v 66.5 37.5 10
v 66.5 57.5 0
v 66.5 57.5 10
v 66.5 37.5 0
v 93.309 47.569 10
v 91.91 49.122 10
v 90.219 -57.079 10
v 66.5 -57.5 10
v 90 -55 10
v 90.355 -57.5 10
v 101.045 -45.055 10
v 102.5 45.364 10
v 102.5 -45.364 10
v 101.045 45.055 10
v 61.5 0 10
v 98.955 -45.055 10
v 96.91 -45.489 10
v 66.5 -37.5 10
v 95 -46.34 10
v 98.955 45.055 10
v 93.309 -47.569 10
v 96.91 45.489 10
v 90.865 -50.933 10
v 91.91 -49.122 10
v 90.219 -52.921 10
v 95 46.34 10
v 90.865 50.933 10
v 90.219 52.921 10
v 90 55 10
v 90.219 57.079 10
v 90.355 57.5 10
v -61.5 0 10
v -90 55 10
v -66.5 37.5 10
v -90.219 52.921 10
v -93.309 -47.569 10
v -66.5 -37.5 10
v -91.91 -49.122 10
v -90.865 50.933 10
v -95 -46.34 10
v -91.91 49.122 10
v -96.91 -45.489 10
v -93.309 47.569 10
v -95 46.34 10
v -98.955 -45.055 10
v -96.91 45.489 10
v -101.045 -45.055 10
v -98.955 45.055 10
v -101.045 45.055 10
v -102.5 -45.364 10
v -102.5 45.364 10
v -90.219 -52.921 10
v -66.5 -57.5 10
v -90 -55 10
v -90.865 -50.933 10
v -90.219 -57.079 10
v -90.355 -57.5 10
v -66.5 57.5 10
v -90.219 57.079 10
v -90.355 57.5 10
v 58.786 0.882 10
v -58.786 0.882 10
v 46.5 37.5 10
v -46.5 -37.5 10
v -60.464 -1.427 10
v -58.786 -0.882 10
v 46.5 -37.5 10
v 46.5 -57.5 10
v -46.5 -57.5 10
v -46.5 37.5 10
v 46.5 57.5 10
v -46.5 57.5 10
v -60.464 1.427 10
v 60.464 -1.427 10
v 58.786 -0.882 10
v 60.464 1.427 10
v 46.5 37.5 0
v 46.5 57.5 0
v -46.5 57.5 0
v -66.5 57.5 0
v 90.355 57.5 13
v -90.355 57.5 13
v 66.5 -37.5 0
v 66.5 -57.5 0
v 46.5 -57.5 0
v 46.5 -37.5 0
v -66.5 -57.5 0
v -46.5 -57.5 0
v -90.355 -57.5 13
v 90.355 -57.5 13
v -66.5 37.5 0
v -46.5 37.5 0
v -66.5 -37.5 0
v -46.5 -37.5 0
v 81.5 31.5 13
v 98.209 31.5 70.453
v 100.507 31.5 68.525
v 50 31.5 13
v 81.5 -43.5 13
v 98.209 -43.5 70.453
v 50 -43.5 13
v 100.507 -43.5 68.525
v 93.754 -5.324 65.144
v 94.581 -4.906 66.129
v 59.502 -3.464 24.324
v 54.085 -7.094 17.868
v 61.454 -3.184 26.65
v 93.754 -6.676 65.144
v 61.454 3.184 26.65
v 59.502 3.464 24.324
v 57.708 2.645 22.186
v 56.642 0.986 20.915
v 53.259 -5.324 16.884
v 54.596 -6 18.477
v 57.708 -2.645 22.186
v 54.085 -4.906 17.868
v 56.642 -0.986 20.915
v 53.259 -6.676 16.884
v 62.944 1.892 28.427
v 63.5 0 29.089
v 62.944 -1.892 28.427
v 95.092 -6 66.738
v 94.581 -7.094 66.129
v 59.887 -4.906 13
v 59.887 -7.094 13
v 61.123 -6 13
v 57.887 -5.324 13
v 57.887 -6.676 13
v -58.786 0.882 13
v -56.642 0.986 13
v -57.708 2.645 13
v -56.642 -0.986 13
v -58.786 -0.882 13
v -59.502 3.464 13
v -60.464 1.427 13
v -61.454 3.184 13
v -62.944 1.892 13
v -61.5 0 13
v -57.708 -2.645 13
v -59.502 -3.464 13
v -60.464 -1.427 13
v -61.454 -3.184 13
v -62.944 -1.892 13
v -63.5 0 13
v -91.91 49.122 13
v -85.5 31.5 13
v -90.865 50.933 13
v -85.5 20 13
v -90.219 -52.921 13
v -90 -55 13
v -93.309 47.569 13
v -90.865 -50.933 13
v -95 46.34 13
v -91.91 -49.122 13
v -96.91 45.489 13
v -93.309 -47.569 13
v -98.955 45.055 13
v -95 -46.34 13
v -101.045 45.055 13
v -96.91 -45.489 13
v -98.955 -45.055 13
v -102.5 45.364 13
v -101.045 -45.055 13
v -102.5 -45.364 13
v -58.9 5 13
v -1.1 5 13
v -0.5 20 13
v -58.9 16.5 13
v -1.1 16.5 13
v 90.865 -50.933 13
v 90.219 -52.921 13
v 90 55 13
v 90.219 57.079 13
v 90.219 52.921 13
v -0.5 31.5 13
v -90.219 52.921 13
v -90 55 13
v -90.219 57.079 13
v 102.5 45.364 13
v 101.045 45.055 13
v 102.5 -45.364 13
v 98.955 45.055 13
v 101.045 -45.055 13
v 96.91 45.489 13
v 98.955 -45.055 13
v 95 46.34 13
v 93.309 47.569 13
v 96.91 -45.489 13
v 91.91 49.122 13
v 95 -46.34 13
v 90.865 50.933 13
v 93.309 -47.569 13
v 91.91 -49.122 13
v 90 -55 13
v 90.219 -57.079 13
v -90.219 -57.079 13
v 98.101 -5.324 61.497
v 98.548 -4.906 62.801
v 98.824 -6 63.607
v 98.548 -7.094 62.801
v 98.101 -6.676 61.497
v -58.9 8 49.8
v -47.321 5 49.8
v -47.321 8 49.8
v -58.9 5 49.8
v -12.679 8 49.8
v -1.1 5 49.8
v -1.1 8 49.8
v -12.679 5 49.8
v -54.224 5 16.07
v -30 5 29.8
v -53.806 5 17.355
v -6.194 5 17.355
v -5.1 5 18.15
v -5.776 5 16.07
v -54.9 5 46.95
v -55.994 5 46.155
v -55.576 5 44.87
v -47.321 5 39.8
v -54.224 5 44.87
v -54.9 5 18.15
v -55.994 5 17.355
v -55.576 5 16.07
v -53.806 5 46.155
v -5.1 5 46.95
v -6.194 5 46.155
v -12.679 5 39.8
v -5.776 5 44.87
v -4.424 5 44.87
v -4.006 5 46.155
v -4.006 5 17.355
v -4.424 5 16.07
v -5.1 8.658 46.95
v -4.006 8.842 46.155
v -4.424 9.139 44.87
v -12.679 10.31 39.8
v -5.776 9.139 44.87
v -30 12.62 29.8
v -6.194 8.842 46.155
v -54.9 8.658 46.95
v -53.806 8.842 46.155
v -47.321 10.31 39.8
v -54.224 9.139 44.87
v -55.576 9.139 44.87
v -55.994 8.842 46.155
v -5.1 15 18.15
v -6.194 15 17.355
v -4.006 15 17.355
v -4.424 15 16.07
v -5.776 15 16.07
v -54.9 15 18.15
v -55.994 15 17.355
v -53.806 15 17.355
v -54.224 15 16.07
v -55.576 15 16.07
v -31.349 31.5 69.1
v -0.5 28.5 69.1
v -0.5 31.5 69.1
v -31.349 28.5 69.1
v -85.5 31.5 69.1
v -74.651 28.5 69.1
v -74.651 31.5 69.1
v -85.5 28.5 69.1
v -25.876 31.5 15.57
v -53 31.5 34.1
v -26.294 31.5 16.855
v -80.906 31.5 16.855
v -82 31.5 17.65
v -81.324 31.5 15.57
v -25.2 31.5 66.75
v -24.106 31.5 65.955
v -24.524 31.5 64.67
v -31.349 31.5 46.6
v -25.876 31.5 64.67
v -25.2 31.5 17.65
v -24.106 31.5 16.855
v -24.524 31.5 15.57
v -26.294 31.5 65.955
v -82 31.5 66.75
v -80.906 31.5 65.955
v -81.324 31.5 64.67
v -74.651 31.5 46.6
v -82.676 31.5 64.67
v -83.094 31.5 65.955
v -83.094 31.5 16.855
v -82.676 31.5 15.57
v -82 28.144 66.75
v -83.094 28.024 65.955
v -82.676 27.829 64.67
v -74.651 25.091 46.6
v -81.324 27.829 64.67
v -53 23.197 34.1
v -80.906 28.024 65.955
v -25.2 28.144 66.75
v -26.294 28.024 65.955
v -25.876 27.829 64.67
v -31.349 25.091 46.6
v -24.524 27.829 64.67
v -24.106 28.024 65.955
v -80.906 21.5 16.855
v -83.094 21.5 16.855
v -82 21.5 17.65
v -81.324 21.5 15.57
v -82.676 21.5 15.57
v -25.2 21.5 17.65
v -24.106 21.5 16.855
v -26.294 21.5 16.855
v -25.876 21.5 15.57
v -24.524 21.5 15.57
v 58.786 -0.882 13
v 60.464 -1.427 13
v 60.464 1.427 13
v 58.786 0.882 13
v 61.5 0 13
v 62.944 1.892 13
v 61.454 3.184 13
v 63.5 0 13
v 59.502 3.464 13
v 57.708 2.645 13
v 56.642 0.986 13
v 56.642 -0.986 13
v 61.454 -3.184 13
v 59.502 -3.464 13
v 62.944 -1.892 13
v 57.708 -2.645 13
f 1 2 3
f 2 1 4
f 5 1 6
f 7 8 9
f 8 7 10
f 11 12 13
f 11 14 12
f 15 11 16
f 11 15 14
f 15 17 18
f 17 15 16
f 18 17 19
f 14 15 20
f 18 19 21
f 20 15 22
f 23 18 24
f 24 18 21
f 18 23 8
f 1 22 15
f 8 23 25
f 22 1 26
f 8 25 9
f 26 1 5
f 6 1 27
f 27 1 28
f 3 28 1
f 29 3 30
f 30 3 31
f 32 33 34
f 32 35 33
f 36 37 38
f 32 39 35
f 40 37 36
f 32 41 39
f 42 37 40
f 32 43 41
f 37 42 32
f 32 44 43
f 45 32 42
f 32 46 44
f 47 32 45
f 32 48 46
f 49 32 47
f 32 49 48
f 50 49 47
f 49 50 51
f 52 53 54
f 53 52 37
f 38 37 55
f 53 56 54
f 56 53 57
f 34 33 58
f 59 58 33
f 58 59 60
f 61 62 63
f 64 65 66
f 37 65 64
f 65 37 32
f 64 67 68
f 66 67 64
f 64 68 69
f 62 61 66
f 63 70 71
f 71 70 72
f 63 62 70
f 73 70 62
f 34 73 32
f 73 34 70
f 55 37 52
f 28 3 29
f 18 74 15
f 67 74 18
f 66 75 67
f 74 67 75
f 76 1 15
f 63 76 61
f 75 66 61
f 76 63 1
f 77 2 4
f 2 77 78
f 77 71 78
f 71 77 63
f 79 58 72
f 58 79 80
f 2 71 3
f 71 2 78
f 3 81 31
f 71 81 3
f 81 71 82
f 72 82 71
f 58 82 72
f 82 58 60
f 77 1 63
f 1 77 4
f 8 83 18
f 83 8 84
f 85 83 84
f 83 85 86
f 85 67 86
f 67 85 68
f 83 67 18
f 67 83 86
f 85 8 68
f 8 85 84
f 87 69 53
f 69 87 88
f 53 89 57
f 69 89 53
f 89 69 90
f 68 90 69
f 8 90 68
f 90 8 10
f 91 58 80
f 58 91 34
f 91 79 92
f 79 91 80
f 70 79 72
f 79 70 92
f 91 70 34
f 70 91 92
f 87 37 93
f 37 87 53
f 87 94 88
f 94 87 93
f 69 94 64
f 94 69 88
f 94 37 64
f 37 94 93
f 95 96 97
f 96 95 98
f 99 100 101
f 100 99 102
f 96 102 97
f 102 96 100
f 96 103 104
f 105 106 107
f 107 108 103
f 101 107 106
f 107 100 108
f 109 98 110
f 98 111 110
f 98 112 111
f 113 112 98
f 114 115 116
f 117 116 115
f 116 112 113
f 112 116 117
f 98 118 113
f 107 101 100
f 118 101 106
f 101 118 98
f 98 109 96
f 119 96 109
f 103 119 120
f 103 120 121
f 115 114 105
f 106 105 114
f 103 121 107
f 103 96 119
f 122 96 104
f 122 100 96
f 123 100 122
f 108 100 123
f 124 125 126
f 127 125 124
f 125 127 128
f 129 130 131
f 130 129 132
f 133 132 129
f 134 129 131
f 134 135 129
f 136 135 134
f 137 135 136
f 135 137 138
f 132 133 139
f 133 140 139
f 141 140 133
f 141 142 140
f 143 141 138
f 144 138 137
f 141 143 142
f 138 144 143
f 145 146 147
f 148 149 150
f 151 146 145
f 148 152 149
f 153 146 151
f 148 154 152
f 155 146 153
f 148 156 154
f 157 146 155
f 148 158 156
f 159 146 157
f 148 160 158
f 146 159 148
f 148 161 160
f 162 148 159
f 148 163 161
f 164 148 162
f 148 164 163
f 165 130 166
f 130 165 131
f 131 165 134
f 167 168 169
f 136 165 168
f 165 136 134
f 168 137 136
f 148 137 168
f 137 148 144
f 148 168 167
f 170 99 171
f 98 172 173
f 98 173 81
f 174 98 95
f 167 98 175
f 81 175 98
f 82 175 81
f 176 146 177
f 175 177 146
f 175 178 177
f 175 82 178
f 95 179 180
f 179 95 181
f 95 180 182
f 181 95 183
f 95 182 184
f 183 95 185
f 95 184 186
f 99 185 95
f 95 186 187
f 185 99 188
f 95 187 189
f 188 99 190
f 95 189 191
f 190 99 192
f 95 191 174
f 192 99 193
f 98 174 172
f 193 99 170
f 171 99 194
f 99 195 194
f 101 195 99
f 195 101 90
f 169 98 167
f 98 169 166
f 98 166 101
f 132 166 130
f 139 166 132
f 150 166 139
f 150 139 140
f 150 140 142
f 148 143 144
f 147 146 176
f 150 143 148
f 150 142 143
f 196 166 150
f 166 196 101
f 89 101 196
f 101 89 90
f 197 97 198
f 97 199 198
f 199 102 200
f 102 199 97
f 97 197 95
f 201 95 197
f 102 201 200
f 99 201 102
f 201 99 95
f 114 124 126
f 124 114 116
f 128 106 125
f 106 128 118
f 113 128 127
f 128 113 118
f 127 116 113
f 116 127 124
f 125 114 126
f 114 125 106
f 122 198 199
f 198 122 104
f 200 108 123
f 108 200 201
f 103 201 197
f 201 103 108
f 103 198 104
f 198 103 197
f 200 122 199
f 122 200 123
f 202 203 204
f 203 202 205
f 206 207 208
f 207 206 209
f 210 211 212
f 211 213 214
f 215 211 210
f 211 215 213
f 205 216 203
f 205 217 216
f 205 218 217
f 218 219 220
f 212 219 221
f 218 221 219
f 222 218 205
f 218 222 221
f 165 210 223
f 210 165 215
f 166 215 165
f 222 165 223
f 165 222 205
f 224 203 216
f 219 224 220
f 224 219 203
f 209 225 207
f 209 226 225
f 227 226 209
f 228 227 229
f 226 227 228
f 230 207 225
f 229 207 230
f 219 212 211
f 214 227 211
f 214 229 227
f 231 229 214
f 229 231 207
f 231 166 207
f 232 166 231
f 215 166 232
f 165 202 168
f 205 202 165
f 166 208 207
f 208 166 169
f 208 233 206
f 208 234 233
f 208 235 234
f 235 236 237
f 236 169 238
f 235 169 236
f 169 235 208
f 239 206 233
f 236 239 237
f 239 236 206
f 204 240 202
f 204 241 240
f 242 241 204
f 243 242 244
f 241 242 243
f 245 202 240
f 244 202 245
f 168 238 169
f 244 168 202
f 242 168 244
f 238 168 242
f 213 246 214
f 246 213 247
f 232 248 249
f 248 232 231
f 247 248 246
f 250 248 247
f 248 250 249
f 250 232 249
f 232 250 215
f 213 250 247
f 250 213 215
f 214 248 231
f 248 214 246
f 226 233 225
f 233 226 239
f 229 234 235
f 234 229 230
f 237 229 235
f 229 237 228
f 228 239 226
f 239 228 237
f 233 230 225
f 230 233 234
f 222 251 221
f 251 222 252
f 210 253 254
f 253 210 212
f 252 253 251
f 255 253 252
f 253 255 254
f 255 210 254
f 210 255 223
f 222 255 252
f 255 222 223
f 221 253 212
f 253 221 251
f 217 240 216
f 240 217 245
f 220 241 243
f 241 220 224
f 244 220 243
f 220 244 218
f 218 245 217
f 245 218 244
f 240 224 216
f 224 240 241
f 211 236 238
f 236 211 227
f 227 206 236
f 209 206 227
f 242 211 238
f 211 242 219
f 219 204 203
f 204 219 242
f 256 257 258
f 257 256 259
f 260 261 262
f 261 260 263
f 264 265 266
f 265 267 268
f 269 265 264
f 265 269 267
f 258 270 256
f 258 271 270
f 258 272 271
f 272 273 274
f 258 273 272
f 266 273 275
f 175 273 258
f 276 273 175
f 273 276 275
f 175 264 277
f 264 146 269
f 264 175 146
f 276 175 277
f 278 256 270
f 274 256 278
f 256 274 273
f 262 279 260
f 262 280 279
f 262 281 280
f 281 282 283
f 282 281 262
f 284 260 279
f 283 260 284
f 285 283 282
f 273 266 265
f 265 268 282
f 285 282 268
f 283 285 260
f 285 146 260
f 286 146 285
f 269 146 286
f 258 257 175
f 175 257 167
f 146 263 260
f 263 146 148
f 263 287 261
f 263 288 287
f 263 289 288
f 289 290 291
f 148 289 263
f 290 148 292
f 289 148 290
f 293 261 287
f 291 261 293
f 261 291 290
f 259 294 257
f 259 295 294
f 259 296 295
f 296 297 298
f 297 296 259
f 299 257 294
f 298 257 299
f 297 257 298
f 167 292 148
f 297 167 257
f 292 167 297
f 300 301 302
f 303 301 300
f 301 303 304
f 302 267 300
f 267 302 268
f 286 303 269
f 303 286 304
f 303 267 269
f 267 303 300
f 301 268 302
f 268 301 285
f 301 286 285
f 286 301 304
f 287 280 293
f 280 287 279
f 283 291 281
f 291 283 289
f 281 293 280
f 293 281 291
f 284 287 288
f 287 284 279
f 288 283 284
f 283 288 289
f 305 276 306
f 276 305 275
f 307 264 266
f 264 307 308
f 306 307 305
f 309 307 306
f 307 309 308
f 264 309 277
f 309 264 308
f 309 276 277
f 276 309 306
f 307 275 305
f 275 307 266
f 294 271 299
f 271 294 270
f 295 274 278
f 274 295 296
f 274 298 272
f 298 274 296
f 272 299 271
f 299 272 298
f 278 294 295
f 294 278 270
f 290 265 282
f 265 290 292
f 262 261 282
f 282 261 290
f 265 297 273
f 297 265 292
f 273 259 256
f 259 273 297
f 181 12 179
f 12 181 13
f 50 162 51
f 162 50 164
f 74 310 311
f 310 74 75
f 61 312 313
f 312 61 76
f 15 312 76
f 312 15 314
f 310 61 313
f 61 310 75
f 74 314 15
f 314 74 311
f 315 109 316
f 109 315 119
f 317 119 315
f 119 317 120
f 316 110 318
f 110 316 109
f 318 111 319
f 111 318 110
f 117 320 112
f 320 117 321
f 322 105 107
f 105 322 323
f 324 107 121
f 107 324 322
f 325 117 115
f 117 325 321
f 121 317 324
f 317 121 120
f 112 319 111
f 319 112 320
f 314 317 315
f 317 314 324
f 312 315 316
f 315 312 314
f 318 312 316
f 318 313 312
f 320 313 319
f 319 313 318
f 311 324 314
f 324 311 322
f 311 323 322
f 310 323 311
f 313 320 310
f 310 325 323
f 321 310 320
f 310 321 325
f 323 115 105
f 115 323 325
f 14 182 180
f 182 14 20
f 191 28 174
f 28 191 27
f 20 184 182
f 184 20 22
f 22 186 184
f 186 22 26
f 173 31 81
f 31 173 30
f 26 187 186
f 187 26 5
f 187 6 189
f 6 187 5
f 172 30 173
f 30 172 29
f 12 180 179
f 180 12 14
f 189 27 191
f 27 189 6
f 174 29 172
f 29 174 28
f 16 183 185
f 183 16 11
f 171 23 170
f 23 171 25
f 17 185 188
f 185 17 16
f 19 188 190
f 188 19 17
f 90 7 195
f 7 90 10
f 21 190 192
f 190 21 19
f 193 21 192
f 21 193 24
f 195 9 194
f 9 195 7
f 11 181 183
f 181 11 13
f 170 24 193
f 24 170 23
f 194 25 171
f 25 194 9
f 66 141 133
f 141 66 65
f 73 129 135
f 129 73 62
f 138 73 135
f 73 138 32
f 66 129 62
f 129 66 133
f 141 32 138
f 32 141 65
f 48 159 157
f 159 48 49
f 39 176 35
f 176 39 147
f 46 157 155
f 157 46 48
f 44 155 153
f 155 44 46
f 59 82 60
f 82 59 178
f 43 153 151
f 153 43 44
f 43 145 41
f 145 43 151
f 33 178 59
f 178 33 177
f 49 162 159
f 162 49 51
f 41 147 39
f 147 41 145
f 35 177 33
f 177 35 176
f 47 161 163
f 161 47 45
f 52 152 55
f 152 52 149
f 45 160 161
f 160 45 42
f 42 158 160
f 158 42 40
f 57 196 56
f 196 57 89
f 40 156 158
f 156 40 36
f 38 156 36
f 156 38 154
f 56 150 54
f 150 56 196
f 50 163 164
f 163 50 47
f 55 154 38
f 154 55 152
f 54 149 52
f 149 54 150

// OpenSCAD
bottom_hole_dist = 120;
bottom_rise = 10;
width = 205;
height = 115;
rounding_w = 200;
rounding_h = 110;
rounding_r = 10;
max_depth = 80;
plateau_depth = 3;
wall = 3;
hole_d = 3;
hole_indent_depth = 0;
hole_indent_d = 7;
support_side = 20;
support_dist = 93; // x distance between supports

small_hole_depth=10;
small_hole_d = 2.3;

dc_converter_side = 75;
dc_converter_hole_dist = 63;

ups_w = 57.8;
ups_h = 36.8;
ups_hole_pos = 4;

rpi_w = 85;
rpi_h = 56.1;
rpi_hole_pos = 3.5;
rpi_hole_dist = 56.8;
whole_plate();

module whole_plate() {
    difference() {
        union() {
            // Additive
            plateau();
            for (mx = [[0,0,0], [1,0,0]]) {
                mirror(mx) {
                    for (my = [[0,0,0], [0,1,0]]) {
                        mirror(my) {
                            support();
                        }
                    }
                }
            }
            translate([0,0,plateau_depth+bottom_rise]) {
                // DC Converter
                translate([50,-6,0]) {
                    difference() {
                        angle=40;
                        wall(dc_converter_side,dc_converter_side,angle,30);
                        rotate([0,angle-90,0]) {
                            first = (dc_converter_side-dc_converter_hole_dist)/2;
                            hole(first,0);
                            hole(first+dc_converter_hole_dist,0);
                        }
                    }
                }
                
                // PicoUPS
                translate([-30,5,0]) {
                    rotate([0,0,90]) {

                        difference() {
                            wall(ups_w,ups_h,0,10);
                            rotate([0,-90,0]) {
                                for (y = [-ups_w/2+ups_hole_pos,ups_w/2-ups_hole_pos]) {
                                    for (x = [ups_hole_pos,ups_h-ups_hole_pos]) {
                                        hole(x,y);
                                    }
                                }
                            }
                            // Screw helper
                            translate([-1,0,ups_h]) rotate([0,90,0]) cylinder(13,20,20,$fn=6);
                        }
                    }
                }
                
                // Raspberry Pi
                translate([-43,dc_converter_side/2-6,0]) {
                    rotate([0,0,-90]) {
                        difference() {
                            wall(rpi_w,rpi_h,0,10);
                            rotate([0,-90,0]) {
                                for (y = [-rpi_w/2+rpi_hole_pos,-rpi_w/2+rpi_hole_pos+rpi_hole_dist]) {
                                    for (x = [rpi_hole_pos,rpi_h-rpi_hole_pos]) {
                                        hole(x,y);
                                    }
                                }
                            }
                            // Screw helper
                            translate([-1,-10,rpi_h-10]) rotate([0,90,0]) cylinder(13,25,25,$fn=6);
                        }
                    }
                }

            }
        }
        // Substractive
        for (mx = [[0,0,0], [1,0,0]]) {
            mirror(mx) {
                for (my = [[0,0,0], [0,1,0]]) {
                    mirror(my) {
                        rounding();
                        mount_hole();
                    }
                }
            }
        }
    }
}

module wall(width, height, rotation, leg=10) {
    translate([0,-width/2,0]) {
        rotate([0,rotation,0]) {
            cube([wall,width,height]);
        }
    }
    
    trig_x = sin(rotation)*height+cos(rotation)*wall;
    trig_y = cos(rotation)*height-sin(rotation)*wall;

    hull() {
    for (my = [[0,0,0],[0,1,0]]) {
        mirror(my) {
            translate([0,width/2,0]) {
                rotate([90,0,0]) {
                    linear_extrude(1) {
                        polygon([[0, 0], [leg+wall/2,0], [trig_x,trig_y]]);
                    }
                }
            }
        }
    }}
}

module rounding() {
    translate([rounding_w/2, rounding_h/2, 0]) {
        cylinder(max_depth, rounding_r,rounding_r);
    }
}

module plateau() {
    translate([0,0,plateau_depth/2+bottom_rise]) {
        cube([width,height,plateau_depth], center=true);
    }
}

module mount_hole() {
    translate([bottom_hole_dist/2,0,0]) {
        // Through-hole
        cylinder(max_depth, hole_d/2, hole_d/2);
        // Indentation
        translate([0,0,bottom_rise+plateau_depth-hole_indent_depth]) {
            cylinder(max_depth, hole_indent_d/2, hole_indent_d/2);
        }
    }
}

module support() {
    translate([support_dist/2,height/2-support_side,0]) {
        cube([support_side,support_side,bottom_rise]);
    }
}

module hole(x, y) {
    translate([x,y,1]) {
        mirror([0,0,1]) {
            cylinder(small_hole_depth+1, small_hole_d/2, small_hole_d/2);
        }
    }
}
